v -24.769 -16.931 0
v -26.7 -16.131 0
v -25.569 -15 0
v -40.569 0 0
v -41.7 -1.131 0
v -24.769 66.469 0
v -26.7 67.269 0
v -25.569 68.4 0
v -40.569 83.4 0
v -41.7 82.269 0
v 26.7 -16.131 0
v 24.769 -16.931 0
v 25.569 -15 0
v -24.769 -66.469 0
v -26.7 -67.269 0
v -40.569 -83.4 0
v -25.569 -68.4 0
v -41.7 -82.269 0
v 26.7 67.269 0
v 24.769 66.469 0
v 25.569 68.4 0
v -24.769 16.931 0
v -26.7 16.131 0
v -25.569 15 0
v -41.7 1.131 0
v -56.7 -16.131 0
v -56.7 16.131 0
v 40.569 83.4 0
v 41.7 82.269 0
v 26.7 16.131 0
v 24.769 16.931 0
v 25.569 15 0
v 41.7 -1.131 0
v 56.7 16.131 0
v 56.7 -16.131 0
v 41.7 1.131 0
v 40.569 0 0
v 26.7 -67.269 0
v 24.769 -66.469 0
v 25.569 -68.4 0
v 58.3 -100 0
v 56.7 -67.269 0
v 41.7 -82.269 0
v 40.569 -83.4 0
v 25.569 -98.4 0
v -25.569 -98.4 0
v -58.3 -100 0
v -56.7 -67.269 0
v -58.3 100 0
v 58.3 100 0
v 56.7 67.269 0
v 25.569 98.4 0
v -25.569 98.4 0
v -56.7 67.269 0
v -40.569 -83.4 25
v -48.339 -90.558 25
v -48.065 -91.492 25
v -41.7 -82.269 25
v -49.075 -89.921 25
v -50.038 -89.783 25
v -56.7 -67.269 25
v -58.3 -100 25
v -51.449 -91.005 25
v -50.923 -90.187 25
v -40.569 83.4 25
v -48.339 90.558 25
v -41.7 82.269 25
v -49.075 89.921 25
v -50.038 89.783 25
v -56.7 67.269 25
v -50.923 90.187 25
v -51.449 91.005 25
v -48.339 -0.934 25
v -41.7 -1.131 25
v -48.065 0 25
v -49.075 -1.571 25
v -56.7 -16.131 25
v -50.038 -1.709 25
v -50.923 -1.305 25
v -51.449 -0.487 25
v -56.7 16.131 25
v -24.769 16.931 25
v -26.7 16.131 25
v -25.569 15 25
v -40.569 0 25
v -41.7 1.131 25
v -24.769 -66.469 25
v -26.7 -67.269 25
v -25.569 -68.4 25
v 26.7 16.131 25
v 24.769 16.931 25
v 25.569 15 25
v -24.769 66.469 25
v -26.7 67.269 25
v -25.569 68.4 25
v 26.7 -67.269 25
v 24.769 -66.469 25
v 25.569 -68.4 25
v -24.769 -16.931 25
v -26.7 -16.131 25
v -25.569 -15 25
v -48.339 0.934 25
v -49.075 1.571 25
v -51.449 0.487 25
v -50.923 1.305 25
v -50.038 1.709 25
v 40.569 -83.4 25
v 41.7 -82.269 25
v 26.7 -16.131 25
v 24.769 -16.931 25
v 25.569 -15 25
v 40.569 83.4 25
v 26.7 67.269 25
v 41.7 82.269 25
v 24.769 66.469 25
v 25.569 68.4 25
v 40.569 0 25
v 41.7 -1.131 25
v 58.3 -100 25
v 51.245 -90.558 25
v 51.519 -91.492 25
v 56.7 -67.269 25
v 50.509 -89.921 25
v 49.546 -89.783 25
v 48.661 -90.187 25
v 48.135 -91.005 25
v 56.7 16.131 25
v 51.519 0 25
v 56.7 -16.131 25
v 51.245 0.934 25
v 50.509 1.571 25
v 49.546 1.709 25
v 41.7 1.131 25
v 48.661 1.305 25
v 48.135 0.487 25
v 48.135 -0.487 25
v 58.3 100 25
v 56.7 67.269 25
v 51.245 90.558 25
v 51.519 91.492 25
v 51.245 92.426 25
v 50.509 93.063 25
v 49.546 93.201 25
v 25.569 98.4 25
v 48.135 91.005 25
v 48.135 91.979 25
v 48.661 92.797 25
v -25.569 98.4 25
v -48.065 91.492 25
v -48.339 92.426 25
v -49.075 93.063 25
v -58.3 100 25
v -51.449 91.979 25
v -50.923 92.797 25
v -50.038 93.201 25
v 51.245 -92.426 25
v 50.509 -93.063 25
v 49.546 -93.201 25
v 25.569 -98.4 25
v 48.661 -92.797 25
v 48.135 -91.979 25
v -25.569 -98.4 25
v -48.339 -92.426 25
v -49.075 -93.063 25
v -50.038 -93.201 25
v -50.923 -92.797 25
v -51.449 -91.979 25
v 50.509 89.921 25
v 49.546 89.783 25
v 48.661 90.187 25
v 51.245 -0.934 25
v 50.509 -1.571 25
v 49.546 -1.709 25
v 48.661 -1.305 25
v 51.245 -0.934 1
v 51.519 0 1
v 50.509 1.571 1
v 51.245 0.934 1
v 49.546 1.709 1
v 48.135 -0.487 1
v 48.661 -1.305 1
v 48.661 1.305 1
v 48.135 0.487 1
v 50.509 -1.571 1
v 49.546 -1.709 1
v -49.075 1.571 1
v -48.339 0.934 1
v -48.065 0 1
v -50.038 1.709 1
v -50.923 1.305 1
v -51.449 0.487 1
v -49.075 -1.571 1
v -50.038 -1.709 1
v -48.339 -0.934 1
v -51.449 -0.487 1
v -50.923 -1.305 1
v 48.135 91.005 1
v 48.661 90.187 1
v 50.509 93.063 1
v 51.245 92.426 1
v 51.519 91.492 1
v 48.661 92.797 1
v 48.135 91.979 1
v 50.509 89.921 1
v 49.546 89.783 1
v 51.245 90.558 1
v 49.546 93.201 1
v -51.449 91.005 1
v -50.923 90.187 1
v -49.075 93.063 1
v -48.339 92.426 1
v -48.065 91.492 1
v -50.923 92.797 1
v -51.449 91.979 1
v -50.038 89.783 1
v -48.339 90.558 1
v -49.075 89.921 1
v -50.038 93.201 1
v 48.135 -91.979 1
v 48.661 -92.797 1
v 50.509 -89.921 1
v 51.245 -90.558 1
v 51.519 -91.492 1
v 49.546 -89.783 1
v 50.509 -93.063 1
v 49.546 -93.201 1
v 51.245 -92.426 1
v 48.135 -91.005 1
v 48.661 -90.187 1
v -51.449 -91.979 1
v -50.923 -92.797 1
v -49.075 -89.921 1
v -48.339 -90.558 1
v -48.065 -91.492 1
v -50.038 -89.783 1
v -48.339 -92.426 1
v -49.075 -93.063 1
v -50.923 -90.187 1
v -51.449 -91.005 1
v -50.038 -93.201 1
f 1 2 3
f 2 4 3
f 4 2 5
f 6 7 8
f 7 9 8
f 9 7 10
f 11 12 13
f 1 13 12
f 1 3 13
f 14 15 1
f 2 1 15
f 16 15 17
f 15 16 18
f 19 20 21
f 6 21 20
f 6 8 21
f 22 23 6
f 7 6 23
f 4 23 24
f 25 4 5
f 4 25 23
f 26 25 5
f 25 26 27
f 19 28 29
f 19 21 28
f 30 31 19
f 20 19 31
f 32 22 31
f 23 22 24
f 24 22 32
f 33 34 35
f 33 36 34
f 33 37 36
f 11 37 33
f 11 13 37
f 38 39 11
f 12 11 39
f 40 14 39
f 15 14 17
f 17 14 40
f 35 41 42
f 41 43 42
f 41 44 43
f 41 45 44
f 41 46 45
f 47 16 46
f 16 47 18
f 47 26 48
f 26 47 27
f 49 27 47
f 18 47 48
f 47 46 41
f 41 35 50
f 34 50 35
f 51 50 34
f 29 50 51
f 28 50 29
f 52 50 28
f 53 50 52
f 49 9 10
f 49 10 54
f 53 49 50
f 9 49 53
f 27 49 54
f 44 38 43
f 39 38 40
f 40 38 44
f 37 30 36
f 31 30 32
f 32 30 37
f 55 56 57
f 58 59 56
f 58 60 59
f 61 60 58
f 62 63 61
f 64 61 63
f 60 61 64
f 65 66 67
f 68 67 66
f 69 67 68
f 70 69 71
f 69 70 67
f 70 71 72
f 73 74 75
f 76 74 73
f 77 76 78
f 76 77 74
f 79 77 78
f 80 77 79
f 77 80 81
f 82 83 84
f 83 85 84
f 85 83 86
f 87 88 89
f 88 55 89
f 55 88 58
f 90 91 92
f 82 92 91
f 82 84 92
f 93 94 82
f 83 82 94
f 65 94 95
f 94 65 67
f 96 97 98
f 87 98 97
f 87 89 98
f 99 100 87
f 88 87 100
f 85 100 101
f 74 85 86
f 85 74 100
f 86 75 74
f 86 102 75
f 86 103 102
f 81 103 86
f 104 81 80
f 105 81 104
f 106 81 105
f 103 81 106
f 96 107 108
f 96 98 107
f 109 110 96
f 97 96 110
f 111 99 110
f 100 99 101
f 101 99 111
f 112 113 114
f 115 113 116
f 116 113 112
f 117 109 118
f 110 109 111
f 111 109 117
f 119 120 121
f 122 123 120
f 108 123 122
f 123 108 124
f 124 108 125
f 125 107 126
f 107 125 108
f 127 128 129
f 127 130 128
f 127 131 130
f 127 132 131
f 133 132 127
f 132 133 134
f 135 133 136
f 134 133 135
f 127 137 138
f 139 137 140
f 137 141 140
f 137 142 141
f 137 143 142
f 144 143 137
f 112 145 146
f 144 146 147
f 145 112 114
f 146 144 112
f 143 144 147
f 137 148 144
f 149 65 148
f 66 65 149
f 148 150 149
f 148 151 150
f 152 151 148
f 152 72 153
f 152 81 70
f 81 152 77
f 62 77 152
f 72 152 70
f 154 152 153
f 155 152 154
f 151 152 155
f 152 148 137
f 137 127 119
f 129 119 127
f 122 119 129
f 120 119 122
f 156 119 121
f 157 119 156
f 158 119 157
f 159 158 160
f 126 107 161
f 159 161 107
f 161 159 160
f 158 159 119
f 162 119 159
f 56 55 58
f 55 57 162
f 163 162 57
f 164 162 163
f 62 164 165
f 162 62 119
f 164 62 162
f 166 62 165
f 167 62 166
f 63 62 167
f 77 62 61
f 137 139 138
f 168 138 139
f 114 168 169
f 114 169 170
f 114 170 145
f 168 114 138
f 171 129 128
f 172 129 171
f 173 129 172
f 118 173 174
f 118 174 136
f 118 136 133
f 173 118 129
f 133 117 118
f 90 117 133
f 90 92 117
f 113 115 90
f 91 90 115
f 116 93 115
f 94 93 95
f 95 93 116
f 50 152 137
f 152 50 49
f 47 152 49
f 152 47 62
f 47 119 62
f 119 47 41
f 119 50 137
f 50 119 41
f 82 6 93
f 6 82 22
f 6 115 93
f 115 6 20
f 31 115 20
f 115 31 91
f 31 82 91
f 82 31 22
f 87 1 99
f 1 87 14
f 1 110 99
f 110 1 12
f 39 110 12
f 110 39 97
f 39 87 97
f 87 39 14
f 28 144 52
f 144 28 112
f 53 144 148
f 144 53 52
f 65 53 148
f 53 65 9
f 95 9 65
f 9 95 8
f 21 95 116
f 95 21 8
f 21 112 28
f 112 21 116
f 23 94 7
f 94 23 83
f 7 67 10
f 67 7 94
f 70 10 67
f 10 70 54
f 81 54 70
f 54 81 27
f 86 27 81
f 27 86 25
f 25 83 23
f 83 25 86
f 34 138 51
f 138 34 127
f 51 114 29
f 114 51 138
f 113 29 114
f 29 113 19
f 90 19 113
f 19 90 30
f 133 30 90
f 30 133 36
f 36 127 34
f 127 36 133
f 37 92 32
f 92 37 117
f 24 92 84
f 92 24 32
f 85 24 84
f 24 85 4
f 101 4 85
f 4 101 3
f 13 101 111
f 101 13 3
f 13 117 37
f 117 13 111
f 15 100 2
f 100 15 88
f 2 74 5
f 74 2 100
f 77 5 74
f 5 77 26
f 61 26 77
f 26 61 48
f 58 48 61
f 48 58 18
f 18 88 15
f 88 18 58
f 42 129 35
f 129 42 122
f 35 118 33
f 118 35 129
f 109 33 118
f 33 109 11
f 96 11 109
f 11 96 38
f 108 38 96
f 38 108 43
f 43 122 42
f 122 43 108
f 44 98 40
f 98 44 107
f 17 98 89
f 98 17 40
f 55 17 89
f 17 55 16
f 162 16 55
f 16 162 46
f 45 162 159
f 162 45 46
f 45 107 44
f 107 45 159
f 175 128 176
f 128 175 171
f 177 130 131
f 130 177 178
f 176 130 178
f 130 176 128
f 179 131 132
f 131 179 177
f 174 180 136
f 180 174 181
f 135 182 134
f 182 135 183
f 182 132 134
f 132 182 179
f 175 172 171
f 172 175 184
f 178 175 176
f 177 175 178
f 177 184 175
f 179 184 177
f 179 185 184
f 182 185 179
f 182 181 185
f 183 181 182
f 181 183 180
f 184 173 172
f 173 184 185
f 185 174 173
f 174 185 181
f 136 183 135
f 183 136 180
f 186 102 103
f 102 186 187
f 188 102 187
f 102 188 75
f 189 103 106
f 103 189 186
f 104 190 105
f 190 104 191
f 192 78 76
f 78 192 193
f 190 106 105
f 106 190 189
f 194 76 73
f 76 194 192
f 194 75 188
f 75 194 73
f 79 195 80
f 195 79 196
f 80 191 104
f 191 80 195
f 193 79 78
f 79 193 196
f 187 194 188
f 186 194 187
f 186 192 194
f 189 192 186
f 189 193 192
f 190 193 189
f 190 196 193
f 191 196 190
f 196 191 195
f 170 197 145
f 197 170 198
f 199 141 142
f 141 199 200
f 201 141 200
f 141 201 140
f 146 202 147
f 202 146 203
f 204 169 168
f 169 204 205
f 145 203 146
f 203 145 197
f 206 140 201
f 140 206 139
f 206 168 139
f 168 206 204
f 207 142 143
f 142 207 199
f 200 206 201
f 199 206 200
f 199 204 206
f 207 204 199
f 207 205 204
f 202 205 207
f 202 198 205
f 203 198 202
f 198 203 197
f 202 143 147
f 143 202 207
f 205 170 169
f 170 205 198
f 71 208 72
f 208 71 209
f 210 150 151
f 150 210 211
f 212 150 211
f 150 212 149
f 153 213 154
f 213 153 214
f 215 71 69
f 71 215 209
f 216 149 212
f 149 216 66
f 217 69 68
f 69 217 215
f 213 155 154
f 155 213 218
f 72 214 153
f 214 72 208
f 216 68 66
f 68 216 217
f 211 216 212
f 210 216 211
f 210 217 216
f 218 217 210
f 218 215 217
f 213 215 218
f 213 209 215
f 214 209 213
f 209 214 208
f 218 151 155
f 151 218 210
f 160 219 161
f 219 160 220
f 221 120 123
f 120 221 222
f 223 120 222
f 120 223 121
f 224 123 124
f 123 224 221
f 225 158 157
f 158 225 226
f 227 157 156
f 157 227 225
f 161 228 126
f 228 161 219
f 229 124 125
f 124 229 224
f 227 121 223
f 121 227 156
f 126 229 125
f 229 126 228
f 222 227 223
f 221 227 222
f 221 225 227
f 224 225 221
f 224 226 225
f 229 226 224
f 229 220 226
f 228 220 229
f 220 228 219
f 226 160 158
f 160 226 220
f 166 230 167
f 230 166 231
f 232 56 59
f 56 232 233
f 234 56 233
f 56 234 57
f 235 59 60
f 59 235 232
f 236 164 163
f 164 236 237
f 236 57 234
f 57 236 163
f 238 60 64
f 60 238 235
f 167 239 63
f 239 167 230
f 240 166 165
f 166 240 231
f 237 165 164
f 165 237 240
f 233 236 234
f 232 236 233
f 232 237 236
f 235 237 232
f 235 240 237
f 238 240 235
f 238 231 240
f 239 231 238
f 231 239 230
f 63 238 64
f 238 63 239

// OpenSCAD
// Character Height.  Default = 7".  Includes wall thickness (below) in this measurement.  But does not include screws, if you mount them at the top/bottom edges.
char_height = 200;

// Wall Thickness in mm
wall_thickness = 1.6;

// Which part would you like to see?
part = "DigitCase"; // [DigitParts:Diffused 'Lenses' and Case,DigitCase:Case Only,DigitLens:Diffused Segments Only]

// *Percent* of char_height that the segment's width will be.
segment_width = 15; //[5:30]

// How thick (from the mounting surface) should the case be?
char_thick = 25;

// How thick should the lens layer be? (mm)
diff_thick = 1.2;

// What is the Tap Drill size of the screws you will mount with?  (mm)
tap_hole_size = 3.454;

// Do you want the centers of the 8 removed?
cutouts = true;   // [true,false]

// should the case follow the edge of the segments?
chamfer = false;  // [true,false]

// do you want mounting holes?
mounting_holes = true; // [true,false]

// Where would you like the holes placed?
mounting_type = "corners";  // [topbottom,corners,centersides,insides]

// Do you want the digit to expand the case size?
expand_case = true; // [true,false]


segwidth = char_height * segment_width / 100;
walltriangle = sqrt( pow(wall_thickness,2) / 2);
segheight = (char_height - wall_thickness * 2 - segwidth - walltriangle * 4) / 2;
segriser = segheight - segwidth;
case_x_out = segheight/2 + segwidth/2 + walltriangle + wall_thickness;
case_y_out = segheight + segwidth/2 + walltriangle*2 + wall_thickness;


print_part();

module print_part(){
    if(part == "DigitParts"){
        diffuse_segments();
        case();
    } else if (part == "DigitCase"){
        if (mounting_holes == true){
            if(mounting_type == "centersides"){
                case();
                sidetabs();
            }
            if(mounting_type == "corners"){
                difference(){
                    case();
                    cornertaps();
                }
            }
        }
    } else if (part == "DigitLens"){
        diffuse_segments();
    }
    
            
    
}

module sidetabs(){
    difference(){
        translate([0,0,char_thick-wall_thickness]){
            linear_extrude(height=wall_thickness){
                polygon([[segheight/2,0],
                    [case_x_out, -segwidth/2-wall_thickness],
                    [case_x_out, segwidth/2+wall_thickness]]);
                polygon([[-segheight/2, 0],
                    [-case_x_out, -segwidth/2 -wall_thickness],
                    [-case_x_out, segwidth/2+wall_thickness]]);
            }
        }
        translate([-segheight/2-segwidth/2+wall_thickness,0,char_thick])
        cylinder(r=tap_hole_size/2,h=1, center=true);
        translate([-segheight/2-segwidth/2+wall_thickness,0,char_thick])
        cylinder(r=1,h=1.5, center=true);
        translate([segheight/2+segwidth/2-wall_thickness,0,char_thick])
        cylinder(r=tap_hole_size/2,h=1, center=true);
        translate([segheight/2+segwidth/2-wall_thickness,0,char_thick])
        cylinder(r=1,h=1.5, center=true);
    }
}

module cornertaps(){
    tapx = case_x_out - wall_thickness - tap_hole_size*2;
    tapy = case_y_out - wall_thickness - tap_hole_size*2;
    translate([tapx,0,char_thick/2+1])
    cylinder(r=tap_hole_size/2, h=char_thick, center=true, $fs = 1);
    translate([-tapx,0,char_thick/2+1])
    cylinder(r=tap_hole_size/2, h=char_thick, center=true, $fs = 1);
    translate([tapx,tapy,char_thick/2+1])
    cylinder(r=tap_hole_size/2, h=char_thick, center=true, $fs = 1);
    translate([-tapx,tapy,char_thick/2+1])
    cylinder(r=tap_hole_size/2, h=char_thick, center=true, $fs = 1);
    translate([tapx,-tapy,char_thick/2+1])
    cylinder(r=tap_hole_size/2, h=char_thick, center=true, $fs = 1);
    translate([-tapx,-tapy,char_thick/2+1])
    cylinder(r=tap_hole_size/2, h=char_thick, center=true, $fs = 1);
}

module case(){
    difference(){
        linear_extrude(height = char_thick)
        if (cutouts == true) {
            if (chamfer == true) {
                difference(){
                    chamfered_case();
                    case_cutouts();
                }
            } else {
                difference(){
                    straight_case();
                    case_cutouts();
                }
            }
        } else {
            if (chamfer == true){
                chamfered_case();
            } else {
                straight_case();
            }  
        }
        linear_extrude(height = char_thick*3, center=true)segments_poly();
    }
    
}

module case_cutouts(){
    translate([0,segheight/2+walltriangle,0])square(segheight-segwidth-wall_thickness, center = true);
    translate([0,-segheight/2-walltriangle,0])square(segheight-segwidth-wall_thickness, center = true);
}

module chamfered_case(){
	/* Old polygon - close, but not perfect
	polygon( points = [
	        [-segheight/2-walltriangle*2, 0], 
	        [-case_x_out, segwidth/2],
	        [-case_x_out, segheight-segwidth/2 + walltriangle*2], 
	        [-segheight/2 +segwidth/2 -walltriangle, case_y_out],
	        [segheight/2 - segwidth/2 + walltriangle, case_y_out],
	        [case_x_out, segheight-segwidth/2 + walltriangle*2],
	        [case_x_out, segwidth/2],
	        [segheight/2+walltriangle*2, 0],
	        [case_x_out, -segwidth/2],
	        [case_x_out, -segheight+segwidth/2-walltriangle*2],
	        [segheight/2 - segwidth/2 + walltriangle, -case_y_out],
	        [-segheight/2 + segwidth/2 - walltriangle, -case_y_out],
	        [-case_x_out, -segheight + segwidth/2 - walltriangle*2],
	        [-case_x_out, -segwidth/2]
	    ], paths = [
	        [0,1,2,3,4,5,6,7,8,9,10,11,12,13]
	    ]);
	*/
	offset(r=wall_thickness){
		segments_poly();
	}
}

module straight_case(){
    square([case_x_out*2, case_y_out*2], center = true);
}

module diffuse_segments(){
    linear_extrude(height = diff_thick)segments_poly();
}

module segments_poly(){ // returns polygons!
    translate([-segheight/2-walltriangle,-segheight/2-walltriangle,0])segment();
    translate([-segheight/2-walltriangle,segheight/2+walltriangle,0])segment();
    translate([segheight/2+walltriangle,-segheight/2-walltriangle,0])segment();
    translate([segheight/2+walltriangle,segheight/2+walltriangle,0])segment();
    rotate([0,0,90])segment();
    translate([0,segheight+walltriangle*2,0])rotate([0,0,90])segment();
    translate([0,-segheight-walltriangle*2.,0])rotate([0,0,90])segment();
}

module segment(){  // returns polygon.
    polygon (points = [
            [-segwidth/2, -segriser/2], [-segwidth/2, segriser/2], [0,segheight/2],
            [segwidth/2, segriser/2], [segwidth/2, -segriser/2], [0,-segheight/2]], 
            paths = [[ 0,1,2,3,4,5]]);
}
